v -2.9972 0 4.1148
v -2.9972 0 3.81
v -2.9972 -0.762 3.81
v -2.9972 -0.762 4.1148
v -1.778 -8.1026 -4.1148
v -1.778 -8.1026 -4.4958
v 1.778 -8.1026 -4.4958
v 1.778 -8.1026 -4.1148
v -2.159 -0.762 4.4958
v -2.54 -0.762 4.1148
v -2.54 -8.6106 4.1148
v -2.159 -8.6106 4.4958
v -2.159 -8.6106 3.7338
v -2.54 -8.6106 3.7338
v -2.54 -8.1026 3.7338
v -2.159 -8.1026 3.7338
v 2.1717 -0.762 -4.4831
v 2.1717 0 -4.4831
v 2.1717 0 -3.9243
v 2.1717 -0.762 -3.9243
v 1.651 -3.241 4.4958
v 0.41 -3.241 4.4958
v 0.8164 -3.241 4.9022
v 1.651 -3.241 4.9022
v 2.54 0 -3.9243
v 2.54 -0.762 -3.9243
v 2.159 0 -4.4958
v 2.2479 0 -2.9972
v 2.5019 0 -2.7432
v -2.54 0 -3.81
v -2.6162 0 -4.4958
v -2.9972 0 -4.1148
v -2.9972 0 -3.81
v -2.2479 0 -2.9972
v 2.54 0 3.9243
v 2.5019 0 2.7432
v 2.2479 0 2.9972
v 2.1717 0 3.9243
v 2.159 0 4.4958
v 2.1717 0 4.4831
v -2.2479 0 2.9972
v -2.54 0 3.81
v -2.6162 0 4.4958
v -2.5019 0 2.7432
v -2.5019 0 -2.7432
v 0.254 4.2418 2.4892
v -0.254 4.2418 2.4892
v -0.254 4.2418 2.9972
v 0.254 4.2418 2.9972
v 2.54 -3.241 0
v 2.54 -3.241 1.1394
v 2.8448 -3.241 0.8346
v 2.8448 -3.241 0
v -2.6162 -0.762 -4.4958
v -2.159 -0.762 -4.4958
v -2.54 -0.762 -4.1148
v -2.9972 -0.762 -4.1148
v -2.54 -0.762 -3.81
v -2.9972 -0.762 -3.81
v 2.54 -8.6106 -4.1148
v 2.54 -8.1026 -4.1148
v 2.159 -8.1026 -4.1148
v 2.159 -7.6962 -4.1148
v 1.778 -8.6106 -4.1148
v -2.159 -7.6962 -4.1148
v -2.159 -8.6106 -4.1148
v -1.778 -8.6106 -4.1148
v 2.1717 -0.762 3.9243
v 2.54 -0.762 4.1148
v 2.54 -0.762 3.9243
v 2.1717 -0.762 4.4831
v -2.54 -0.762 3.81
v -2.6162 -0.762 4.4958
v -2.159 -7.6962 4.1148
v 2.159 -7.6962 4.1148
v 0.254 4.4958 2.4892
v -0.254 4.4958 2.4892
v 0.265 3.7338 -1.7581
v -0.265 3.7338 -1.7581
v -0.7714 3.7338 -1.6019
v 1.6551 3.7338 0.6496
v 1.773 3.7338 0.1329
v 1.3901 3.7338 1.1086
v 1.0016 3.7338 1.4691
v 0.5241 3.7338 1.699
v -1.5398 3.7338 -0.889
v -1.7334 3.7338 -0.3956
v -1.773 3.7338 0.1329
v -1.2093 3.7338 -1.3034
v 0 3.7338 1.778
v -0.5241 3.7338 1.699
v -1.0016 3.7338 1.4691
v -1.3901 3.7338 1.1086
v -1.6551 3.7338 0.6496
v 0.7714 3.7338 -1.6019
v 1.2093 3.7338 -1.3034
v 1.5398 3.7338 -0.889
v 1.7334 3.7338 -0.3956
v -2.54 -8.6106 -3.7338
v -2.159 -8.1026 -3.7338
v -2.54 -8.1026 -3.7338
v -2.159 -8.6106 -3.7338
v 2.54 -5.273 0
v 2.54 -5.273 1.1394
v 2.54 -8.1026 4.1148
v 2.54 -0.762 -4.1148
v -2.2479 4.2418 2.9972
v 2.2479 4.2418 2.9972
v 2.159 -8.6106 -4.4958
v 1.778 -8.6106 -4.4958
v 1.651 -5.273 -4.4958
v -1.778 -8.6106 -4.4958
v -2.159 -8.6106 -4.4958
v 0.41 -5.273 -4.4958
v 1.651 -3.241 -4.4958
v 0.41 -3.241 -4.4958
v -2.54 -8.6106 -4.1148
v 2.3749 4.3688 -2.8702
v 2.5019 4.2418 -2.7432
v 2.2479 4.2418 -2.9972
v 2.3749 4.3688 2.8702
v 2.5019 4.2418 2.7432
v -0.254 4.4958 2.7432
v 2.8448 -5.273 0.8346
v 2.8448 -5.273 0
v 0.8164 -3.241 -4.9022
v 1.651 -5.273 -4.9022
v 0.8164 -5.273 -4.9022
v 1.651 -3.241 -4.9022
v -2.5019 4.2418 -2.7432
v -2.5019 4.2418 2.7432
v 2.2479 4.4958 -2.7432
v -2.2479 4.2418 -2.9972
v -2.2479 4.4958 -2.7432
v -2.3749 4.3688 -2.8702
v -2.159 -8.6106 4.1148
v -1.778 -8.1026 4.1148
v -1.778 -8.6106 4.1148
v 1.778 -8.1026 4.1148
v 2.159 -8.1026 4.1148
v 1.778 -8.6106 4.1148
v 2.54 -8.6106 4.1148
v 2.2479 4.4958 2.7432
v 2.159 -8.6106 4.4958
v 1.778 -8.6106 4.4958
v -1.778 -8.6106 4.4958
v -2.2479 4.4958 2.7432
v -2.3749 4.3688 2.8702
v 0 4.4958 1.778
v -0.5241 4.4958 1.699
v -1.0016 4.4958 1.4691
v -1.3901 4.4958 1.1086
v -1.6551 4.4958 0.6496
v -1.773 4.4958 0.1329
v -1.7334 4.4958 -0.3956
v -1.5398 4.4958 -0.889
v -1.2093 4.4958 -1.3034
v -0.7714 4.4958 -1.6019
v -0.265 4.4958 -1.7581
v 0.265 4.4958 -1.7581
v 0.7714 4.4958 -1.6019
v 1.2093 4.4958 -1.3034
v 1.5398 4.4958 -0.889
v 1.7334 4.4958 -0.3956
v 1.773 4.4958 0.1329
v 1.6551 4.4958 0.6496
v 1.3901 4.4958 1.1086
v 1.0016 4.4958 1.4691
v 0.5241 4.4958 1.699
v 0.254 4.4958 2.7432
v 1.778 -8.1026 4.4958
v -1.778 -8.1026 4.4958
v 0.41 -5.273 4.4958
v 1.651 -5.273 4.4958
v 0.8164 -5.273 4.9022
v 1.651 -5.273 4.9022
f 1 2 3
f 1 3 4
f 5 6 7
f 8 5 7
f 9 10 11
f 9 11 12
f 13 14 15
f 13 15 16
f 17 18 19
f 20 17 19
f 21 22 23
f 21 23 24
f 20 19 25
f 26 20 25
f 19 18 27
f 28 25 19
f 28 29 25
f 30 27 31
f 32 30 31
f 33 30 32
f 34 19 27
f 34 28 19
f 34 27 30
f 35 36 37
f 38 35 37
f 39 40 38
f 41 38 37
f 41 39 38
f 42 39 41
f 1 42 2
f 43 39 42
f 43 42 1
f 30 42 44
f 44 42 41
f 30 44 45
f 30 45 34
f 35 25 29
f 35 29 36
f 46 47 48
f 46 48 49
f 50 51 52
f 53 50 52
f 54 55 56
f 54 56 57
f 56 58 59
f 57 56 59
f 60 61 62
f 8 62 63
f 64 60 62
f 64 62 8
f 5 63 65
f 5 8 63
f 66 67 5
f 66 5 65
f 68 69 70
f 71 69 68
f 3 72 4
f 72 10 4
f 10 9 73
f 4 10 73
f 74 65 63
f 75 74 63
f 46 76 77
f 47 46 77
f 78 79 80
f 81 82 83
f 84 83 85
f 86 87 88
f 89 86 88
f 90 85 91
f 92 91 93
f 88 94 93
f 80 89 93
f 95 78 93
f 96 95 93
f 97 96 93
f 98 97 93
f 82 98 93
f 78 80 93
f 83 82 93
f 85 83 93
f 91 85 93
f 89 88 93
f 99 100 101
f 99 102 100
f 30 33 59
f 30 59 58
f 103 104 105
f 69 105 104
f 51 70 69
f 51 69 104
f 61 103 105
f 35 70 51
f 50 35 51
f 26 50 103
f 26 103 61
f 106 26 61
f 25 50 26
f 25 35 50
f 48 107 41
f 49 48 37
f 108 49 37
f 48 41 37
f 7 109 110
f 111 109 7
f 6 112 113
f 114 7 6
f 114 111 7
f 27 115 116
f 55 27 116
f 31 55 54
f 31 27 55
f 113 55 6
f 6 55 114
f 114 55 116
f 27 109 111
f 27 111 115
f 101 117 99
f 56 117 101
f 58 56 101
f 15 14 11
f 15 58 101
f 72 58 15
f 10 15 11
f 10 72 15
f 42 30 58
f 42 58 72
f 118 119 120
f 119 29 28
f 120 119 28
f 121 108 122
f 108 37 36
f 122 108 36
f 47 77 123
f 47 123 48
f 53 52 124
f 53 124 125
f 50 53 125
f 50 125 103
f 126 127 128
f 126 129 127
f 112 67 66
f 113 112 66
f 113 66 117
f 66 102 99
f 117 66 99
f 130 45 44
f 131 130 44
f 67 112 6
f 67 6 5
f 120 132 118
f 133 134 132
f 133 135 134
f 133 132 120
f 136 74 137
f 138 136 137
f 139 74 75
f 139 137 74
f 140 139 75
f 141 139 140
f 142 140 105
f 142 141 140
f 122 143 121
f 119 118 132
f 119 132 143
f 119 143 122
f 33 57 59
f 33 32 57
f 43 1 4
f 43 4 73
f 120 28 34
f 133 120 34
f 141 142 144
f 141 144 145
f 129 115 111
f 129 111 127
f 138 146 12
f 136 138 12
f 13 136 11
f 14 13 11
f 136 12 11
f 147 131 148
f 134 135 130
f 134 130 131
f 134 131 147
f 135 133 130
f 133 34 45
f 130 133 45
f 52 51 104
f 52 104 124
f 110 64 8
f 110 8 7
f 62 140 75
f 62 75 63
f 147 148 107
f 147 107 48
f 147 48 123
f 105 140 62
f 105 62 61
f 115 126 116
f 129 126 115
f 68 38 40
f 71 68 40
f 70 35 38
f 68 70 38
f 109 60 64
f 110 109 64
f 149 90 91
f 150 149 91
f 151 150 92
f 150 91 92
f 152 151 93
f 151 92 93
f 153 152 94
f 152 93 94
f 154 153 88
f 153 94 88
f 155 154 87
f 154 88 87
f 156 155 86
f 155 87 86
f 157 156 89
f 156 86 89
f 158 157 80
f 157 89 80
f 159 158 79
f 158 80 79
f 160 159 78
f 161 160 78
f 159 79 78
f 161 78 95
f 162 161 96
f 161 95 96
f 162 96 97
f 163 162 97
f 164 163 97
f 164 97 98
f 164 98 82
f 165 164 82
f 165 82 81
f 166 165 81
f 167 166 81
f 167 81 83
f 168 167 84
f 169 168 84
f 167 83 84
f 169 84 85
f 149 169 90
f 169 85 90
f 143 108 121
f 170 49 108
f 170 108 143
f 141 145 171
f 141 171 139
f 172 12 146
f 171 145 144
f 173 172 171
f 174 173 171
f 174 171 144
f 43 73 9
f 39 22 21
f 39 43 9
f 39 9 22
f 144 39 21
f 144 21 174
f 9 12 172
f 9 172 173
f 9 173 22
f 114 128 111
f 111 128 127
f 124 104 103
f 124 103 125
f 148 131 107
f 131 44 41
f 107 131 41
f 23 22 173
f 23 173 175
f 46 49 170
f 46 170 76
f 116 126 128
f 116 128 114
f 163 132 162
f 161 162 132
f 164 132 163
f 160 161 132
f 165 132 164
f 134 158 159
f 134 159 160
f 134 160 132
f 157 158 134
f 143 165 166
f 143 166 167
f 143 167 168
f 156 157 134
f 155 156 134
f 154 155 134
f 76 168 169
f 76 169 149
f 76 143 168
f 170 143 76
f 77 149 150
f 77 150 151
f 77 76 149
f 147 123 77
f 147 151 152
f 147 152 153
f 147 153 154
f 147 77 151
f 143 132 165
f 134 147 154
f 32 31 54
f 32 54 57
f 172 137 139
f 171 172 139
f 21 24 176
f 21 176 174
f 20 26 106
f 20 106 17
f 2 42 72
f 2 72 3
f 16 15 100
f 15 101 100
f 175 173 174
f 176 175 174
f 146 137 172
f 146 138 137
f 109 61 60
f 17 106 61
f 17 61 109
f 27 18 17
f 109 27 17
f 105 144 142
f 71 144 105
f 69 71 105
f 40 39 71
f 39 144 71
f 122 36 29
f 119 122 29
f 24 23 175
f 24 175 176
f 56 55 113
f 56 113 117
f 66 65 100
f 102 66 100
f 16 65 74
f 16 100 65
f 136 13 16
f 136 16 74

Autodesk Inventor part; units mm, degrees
sketch "Sketch_1" plane through (0, 0, 0) normal (0, 1, 0) x (-1, 0, 0)
  line L0 (2.54, -4.1148) -> (2.54, 4.1148)
  line L1 (2.54, 4.1148) -> (2.159, 4.4958)
  line L2 (2.159, 4.4958) -> (-2.159, 4.4958)
  line L3 (-2.159, 4.4958) -> (-2.54, 4.1148)
  line L4 (-2.54, 4.1148) -> (-2.54, -4.1148)
  line L5 (-2.54, -4.1148) -> (-2.159, -4.4958)
  line L6 (-2.159, -4.4958) -> (2.159, -4.4958)
  line L7 (2.159, -4.4958) -> (2.54, -4.1148)
extrude "Extrusion1" add sketch "Sketch_1" against normal blind 8.6106
sketch "Sketch_2" plane through (0, -8.6106, 0) normal (0, 1, 0) x (1, 0, 0)
  line L0 (-2.54, 3.7338) -> (-2.54, -3.7338)
  line L1 (-2.54, -3.7338) -> (-2.159, -3.7338)
  line L2 (-2.159, -3.7338) -> (-2.159, -4.1148)
  line L3 (-2.159, -4.1148) -> (-1.778, -4.1148)
  line L4 (-1.778, -4.1148) -> (-1.778, -4.4958)
  line L5 (-1.778, -4.4958) -> (1.778, -4.4958)
  line L6 (1.778, -4.4958) -> (1.778, -4.1148)
  line L7 (1.778, -4.1148) -> (2.54, -4.1148)
  line L8 (2.54, -4.1148) -> (2.54, 4.1148)
  line L9 (2.54, 4.1148) -> (1.778, 4.1148)
  line L10 (1.778, 4.1148) -> (1.778, 4.4958)
  line L11 (1.778, 4.4958) -> (-1.778, 4.4958)
  line L12 (-1.778, 4.4958) -> (-1.778, 4.1148)
  line L13 (-1.778, 4.1148) -> (-2.159, 4.1148)
  line L14 (-2.159, 4.1148) -> (-2.159, 3.7338)
  line L15 (-2.159, 3.7338) -> (-2.54, 3.7338)
extrude "Extrusion2" cut sketch "Sketch_2" along normal blind 0.508
sketch "Sketch_21" plane through (0, -8.6106, 0) normal (0, 1, 0) x (1, 0, 0)
  line L0 (-2.159, -4.1148) -> (2.159, -4.1148)
  line L1 (2.159, -4.1148) -> (2.159, 4.1148)
  line L2 (2.159, 4.1148) -> (-2.159, 4.1148)
  line L3 (-2.159, 4.1148) -> (-2.159, -4.1148)
extrude "Extrusion3" cut sketch "Sketch_21" along normal blind 0.9144
sketch "Sketch_3" plane through (0, 0, 0) normal (0, 1, 0) x (-1, 0, 0)
  line L0 (-2.1717, -3.9243) -> (-2.6162, -3.9243)
  line L1 (-2.6162, -3.9243) -> (-2.6162, 3.9243)
  line L2 (-2.6162, 3.9243) -> (-2.1717, 3.9243)
  line L3 (-2.1717, 3.9243) -> (-2.1717, 4.4958)
  line L4 (-2.1717, 4.4958) -> (-2.921, 4.4958)
  line L5 (-2.921, 4.4958) -> (-2.921, -4.4958)
  line L6 (-2.921, -4.4958) -> (-2.1717, -4.4958)
  line L7 (-2.1717, -4.4958) -> (-2.1717, -3.9243)
extrude "Extrusion4" cut sketch "Sketch_3" against normal blind 0.762
sketch "Sketch_4" plane through (0, 0, 0) normal (0, 1, 0) x (-1, 0, 0)
  line L0 (2.9972, -3.81) -> (2.5019, -3.81)
  line L1 (2.5019, -3.81) -> (2.5019, 3.81)
  line L2 (2.5019, 3.81) -> (2.9972, 3.81)
  line L3 (2.9972, 3.81) -> (2.9972, 4.1148)
  line L4 (2.9972, 4.1148) -> (2.6162, 4.4958)
  line L5 (2.6162, 4.4958) -> (0.0762, 4.4958)
  line L6 (0.0762, 4.4958) -> (0.0762, -4.4958)
  line L7 (0.0762, -4.4958) -> (2.6162, -4.4958)
  line L8 (2.6162, -4.4958) -> (2.9972, -4.1148)
  line L9 (2.9972, -4.1148) -> (2.9972, -3.81)
extrude "Extrusion5" add sketch "Sketch_4" against normal blind 0.762
sketch "Sketch_5" plane through (0, -3.241, 0) normal (0, 1, 0) x (1, 0, 0)
  line L0 (0.41, -4.4958) -> (0.8164, -4.9022)
  line L1 (0.8164, -4.9022) -> (1.651, -4.9022)
  line L2 (1.651, -4.9022) -> (1.651, -4.4958)
  line L3 (1.651, -4.4958) -> (0.41, -4.4958)
extrude "Extrusion6" add sketch "Sketch_5" against normal blind 2.032
sketch "Sketch_6" plane through (0, -3.241, 0) normal (0, 1, 0) x (1, 0, 0)
  line L0 (0.41, 4.4958) -> (1.651, 4.4958)
  line L1 (1.651, 4.4958) -> (1.651, 4.9022)
  line L2 (1.651, 4.9022) -> (0.8164, 4.9022)
  line L3 (0.8164, 4.9022) -> (0.41, 4.4958)
extrude "Extrusion7" add sketch "Sketch_6" against normal blind 2.032
sketch "Sketch_7" plane through (0, -3.241, 0) normal (0, 1, 0) x (1, 0, 0)
  line L0 (2.54, 0) -> (2.54, -1.1394)
  line L1 (2.54, -1.1394) -> (2.8448, -0.8346)
  line L2 (2.8448, -0.8346) -> (2.8448, 0)
  line L3 (2.8448, 0) -> (2.54, 0)
extrude "Extrusion8" add sketch "Sketch_7" against normal blind 2.032
sketch "Sketch_8" plane through (0, 0, 0) normal (0, 1, 0) x (-1, 0, 0)
  line L0 (2.5019, -2.7432) -> (2.5019, 2.7432)
  line L1 (2.5019, 2.7432) -> (2.2479, 2.9972)
  line L2 (2.2479, 2.9972) -> (-2.2479, 2.9972)
  line L3 (-2.2479, 2.9972) -> (-2.5019, 2.7432)
  line L4 (-2.5019, 2.7432) -> (-2.5019, -2.7432)
  line L5 (-2.5019, -2.7432) -> (-2.2479, -2.9972)
  line L6 (-2.2479, -2.9972) -> (2.2479, -2.9972)
  line L7 (2.2479, -2.9972) -> (2.5019, -2.7432)
extrude "Extrusion9" add sketch "Sketch_8" along normal blind 4.4958
sketch "Sketch_9" plane through (0, 0, 0) normal (1, 0, 0) x (0, 1, 0)
  line L0 (0, 3.2953) -> (0, 2.9972)
  line L1 (0, 2.9972) -> (4.2418, 2.9972)
  line L2 (4.2418, 2.9972) -> (4.4958, 2.7432)
  line L3 (4.4958, 2.7432) -> (4.4958, -2.7432)
  line L4 (4.4958, -2.7432) -> (4.2418, -2.9972)
  line L5 (4.2418, -2.9972) -> (0, -2.9972)
  line L6 (0, -2.9972) -> (0, -3.2953)
  line L7 (0, -3.2953) -> (4.5957, -3.2953)
  line L8 (4.5957, -3.2953) -> (4.5957, 3.2953)
  line L9 (4.5957, 3.2953) -> (0, 3.2953)
extrude "Extrusion10" cut sketch "Sketch_9" along normal mid plane 5.0038
sketch "Sketch_10" plane through (0, 0, 0) normal (0, 0, 1) x (1, 0, 0)
  line L0 (-3.2953, 0) -> (-2.5019, 0)
  line L1 (-2.5019, 0) -> (-2.5019, 4.2418)
  line L2 (-2.5019, 4.2418) -> (-2.2479, 4.4958)
  line L3 (-2.2479, 4.4958) -> (2.2479, 4.4958)
  line L4 (2.2479, 4.4958) -> (2.5019, 4.2418)
  line L5 (2.5019, 4.2418) -> (2.5019, 0)
  line L6 (2.5019, 0) -> (3.2953, 0)
  line L7 (3.2953, 0) -> (3.2953, 4.5957)
  line L8 (3.2953, 4.5957) -> (-3.2953, 4.5957)
  line L9 (-3.2953, 4.5957) -> (-3.2953, 0)
extrude "Extrusion11" cut sketch "Sketch_10" along normal mid plane 5.9944
sketch "Sketch12" plane through (0, 4.4958, 0) normal (0, 1, 0) x (1, 0, 0)
  point P0 (0, 0)
hole "Drilling 1" at (0, 4.4958, 0) direction (0, -1, 0) diameter 3.556 depth 0.762
sketch "Sketch_28" plane through (0, 4.4958, 0) normal (0, 1, 0) x (1, 0, 0)
  line L0 (-0.254, -2.4892) -> (-0.254, -2.9972)
  line L1 (-0.254, -2.9972) -> (0.254, -2.9972)
  line L2 (0.254, -2.9972) -> (0.254, -2.4892)
  line L3 (0.254, -2.4892) -> (-0.254, -2.4892)
extrude "Extrusion12" cut sketch "Sketch_28" against normal blind 0.254
ref_plane "to_bracket_r_XY" through (-2.54, -4.3078, 0) normal (1, 0, 0) x (0, 0, -1)
ref_plane "to_bracket_r_YZ" through (-2.54, -4.3078, 0) normal (0, 0, -1) x (0, 1, 0)
ref_plane "to_bracket_r_ZX" through (-2.54, -4.3078, 0) normal (0, 1, 0) x (1, 0, 0)
ref_plane "to_bracket_r2_XY" through (-4.3942, -4.318, 0) normal (1, 0, 0) x (0, 0, -1)
ref_plane "to_bracket_r2_YZ" through (-4.3942, -4.318, 0) normal (0, 0, -1) x (0, 1, 0)
ref_plane "to_bracket_r2_ZX" through (-4.3942, -4.318, 0) normal (0, 1, 0) x (1, 0, 0)
ref_plane "to_bracket_s_XY" through (-2.54, -4.7015, 0) normal (1, 0, 0) x (0, 0, -1)
ref_plane "to_bracket_s_YZ" through (-2.54, -4.7015, 0) normal (0, 0, -1) x (0, 1, 0)
ref_plane "to_bracket_s_ZX" through (-2.54, -4.7015, 0) normal (0, 1, 0) x (1, 0, 0)
ref_plane "to_bracket_s2_XY" through (-4.3942, -4.7142, 0) normal (1, 0, 0) x (0, 0, -1)
ref_plane "to_bracket_s2_YZ" through (-4.3942, -4.7142, 0) normal (0, 0, -1) x (0, 1, 0)
ref_plane "to_bracket_s2_ZX" through (-4.3942, -4.7142, 0) normal (0, 1, 0) x (1, 0, 0)
ref_plane "to_bracket_v_XY" through (0, -4.1554, 4.3942) normal (0, 0, -1) x (1, 0, 0)
ref_plane "to_bracket_v_YZ" through (0, -4.1554, 4.3942) normal (1, 0, 0) x (0, -1, 0)
ref_plane "to_bracket_v_ZX" through (0, -4.1554, 4.3942) normal (0, -1, 0) x (0, 0, -1)
ref_plane "to_dummy_XY" through (0, 0, 0) normal (0, -1, 0) x (1, 0, 0)
ref_plane "to_dummy_YZ" through (0, 0, 0) normal (1, 0, 0) x (0, 0, 1)
ref_plane "to_dummy_ZX" through (0, 0, 0) normal (0, 0, 1) x (0, -1, 0)
ref_plane "to_terminal_XY" through (0, -7.3406, 0) normal (0, 1, 0) x (1, 0, 0)
ref_plane "to_terminal_YZ" through (0, -7.3406, 0) normal (1, 0, 0) x (0, 0, -1)
ref_plane "to_terminal_ZX" through (0, -7.3406, 0) normal (0, 0, -1) x (0, 1, 0)
ref_plane "to_toggle_XY" through (0, 4.4958, 0) normal (0, -1, 0) x (1, 0, 0)
ref_plane "to_toggle_YZ" through (0, 4.4958, 0) normal (1, 0, 0) x (0, 0, 1)
ref_plane "to_toggle_ZX" through (0, 4.4958, 0) normal (0, 0, 1) x (0, -1, 0)
properties part number "A1-toggle-body"
